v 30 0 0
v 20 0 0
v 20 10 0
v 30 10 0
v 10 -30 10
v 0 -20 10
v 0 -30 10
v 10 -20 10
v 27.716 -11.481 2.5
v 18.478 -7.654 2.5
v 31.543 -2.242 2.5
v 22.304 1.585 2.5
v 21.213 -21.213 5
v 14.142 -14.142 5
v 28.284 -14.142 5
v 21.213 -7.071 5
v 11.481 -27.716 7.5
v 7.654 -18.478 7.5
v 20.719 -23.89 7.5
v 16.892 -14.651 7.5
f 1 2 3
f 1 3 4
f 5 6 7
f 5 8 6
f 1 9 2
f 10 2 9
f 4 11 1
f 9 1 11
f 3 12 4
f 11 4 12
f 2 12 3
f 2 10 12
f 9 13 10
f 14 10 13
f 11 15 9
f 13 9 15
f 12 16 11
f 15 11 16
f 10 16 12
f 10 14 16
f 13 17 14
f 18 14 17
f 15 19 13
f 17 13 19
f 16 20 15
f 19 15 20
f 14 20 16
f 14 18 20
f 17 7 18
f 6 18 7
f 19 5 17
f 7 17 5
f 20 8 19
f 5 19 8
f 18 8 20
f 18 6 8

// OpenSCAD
// A twisted profile that does not straddle the Z axis: the walls lean
// differently edge by edge, so a single diagonal choice for the whole contour is
// 1.3% out even though every vertex is in the right place.
//
// oracle: tris
linear_extrude(height=10, twist=90, slices=4) translate([20,0]) square(10);
